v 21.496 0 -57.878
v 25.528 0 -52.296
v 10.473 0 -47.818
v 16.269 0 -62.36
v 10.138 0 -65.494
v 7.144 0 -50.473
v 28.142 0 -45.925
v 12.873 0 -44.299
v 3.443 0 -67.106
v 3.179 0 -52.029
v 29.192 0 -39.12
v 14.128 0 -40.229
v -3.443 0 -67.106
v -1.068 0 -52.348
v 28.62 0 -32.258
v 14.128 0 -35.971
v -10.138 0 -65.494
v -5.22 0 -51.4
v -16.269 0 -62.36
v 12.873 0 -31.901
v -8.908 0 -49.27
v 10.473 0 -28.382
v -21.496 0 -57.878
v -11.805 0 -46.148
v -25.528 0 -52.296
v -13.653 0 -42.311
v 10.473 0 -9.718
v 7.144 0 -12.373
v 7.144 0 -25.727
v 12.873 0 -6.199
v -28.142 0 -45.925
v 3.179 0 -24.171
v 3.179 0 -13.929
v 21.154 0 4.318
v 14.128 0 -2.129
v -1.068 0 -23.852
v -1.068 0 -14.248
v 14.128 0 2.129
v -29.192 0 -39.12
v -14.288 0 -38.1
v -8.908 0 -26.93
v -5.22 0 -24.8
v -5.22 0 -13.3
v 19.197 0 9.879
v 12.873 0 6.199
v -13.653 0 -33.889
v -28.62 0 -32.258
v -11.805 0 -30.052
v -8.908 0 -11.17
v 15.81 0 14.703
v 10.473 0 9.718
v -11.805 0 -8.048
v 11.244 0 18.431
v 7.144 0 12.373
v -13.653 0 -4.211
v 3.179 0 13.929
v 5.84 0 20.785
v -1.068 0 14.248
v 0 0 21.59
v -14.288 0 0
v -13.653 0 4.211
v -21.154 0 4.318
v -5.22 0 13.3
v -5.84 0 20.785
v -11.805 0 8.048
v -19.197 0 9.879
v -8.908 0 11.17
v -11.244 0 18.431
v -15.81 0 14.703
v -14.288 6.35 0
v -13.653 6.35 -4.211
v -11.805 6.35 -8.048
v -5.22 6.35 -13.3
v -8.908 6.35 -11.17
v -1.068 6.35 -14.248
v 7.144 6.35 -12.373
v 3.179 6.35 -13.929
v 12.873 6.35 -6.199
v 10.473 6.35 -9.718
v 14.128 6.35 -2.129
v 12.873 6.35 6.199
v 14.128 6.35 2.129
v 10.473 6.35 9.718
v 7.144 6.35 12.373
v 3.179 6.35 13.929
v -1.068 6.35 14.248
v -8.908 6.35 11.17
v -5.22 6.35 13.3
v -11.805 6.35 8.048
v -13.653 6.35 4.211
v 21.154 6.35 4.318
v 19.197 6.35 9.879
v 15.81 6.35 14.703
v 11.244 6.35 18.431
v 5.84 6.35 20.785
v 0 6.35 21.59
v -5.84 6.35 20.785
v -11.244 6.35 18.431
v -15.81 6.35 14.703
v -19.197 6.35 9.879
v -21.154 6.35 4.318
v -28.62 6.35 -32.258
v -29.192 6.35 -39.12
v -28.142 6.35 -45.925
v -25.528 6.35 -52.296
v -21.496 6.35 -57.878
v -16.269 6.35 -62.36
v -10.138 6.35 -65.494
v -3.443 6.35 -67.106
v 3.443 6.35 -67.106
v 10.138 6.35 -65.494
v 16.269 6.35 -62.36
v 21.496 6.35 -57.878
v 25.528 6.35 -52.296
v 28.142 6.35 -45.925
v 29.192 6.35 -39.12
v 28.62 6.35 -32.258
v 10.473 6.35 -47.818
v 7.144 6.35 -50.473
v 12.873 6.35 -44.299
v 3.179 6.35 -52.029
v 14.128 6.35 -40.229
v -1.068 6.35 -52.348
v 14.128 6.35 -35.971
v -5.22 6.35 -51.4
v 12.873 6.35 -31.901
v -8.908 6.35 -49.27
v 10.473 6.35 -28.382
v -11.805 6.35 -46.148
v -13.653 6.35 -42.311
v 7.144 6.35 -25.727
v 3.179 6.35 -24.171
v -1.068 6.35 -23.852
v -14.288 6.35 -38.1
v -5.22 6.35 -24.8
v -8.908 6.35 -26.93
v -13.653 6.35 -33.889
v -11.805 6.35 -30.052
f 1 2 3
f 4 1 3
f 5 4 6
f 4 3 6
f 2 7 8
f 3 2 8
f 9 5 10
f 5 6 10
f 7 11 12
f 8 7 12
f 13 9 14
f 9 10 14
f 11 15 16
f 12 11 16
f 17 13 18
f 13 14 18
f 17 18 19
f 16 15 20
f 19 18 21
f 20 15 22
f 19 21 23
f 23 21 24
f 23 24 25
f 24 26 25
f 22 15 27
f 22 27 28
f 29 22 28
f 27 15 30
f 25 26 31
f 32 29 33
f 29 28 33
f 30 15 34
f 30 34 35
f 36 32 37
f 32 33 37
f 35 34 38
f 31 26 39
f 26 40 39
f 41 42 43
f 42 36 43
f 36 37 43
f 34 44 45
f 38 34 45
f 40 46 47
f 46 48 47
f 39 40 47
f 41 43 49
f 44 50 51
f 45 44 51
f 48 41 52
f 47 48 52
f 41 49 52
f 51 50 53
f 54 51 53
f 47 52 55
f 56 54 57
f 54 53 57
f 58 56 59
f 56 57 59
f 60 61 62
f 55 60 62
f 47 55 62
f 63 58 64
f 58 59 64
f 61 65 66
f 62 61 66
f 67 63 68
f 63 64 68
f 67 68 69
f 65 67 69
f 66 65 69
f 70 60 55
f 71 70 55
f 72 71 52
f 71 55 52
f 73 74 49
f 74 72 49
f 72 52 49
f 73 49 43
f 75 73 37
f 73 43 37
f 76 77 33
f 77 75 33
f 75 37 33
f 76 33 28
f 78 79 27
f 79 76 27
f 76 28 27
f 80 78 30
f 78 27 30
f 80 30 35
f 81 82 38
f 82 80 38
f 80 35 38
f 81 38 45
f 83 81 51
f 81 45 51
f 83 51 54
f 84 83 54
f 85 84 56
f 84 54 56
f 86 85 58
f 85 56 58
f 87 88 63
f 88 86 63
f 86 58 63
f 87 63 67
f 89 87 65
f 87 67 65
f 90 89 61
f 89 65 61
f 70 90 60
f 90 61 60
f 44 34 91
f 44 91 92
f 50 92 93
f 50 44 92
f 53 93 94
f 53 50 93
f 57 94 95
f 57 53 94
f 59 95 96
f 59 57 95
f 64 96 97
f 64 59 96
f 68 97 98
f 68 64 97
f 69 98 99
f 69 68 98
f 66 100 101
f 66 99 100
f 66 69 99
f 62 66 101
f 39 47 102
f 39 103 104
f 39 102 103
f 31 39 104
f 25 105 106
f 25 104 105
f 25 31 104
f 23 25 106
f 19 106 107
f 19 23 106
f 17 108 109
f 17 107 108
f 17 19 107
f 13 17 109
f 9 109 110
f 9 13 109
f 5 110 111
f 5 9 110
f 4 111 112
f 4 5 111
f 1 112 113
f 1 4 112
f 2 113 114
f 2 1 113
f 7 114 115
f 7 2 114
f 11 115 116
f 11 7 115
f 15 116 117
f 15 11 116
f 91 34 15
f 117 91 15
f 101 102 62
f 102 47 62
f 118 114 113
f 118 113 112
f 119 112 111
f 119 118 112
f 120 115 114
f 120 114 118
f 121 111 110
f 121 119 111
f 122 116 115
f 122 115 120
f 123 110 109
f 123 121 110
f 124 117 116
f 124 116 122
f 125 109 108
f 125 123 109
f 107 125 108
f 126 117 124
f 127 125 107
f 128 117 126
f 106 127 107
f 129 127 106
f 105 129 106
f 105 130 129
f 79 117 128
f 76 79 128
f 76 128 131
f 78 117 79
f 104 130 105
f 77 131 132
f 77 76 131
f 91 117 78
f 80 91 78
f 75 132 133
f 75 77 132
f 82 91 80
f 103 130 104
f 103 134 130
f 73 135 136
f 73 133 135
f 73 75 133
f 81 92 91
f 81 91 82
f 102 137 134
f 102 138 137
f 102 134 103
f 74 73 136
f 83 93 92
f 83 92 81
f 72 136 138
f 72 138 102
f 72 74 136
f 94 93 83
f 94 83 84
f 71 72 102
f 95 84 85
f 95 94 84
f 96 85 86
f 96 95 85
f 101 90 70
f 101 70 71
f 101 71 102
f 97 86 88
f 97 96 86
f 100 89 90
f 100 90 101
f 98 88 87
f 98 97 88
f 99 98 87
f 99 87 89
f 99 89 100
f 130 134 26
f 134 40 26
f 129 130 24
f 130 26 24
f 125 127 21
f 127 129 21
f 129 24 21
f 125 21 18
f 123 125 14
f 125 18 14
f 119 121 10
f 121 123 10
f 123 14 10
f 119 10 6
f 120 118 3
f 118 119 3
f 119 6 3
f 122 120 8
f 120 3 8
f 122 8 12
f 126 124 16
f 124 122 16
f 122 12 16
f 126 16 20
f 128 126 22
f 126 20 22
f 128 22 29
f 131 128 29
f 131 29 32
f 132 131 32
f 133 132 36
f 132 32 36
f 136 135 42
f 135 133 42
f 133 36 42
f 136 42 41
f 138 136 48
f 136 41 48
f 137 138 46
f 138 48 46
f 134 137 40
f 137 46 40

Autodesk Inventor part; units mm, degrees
ref_plane "YZ Plane" through (0, 0, 0) normal (1, 0, 0) x (0, 1, 0)
ref_plane "XZ Plane" through (0, 0, 0) normal (0, 1, 0) x (-1, 0, 0)
ref_plane "XY Plane" through (0, 0, 0) normal (0, 0, 1) x (1, 0, 0)
sketch "Sketch1" plane through (0, 0, 0) normal (0, 1, 0) x (-1, 0, 0)
  circle A0 centre (0, 0) radius 15.24 construction
  circle A1 centre (0, -38.1) radius 22.86 construction
  circle A2 centre (0, 0) radius 14.2875
  circle A3 centre (0, -38.1) radius 14.2875
  line L0 (-14.9321, 3.048) -> (-22.3981, -33.528) construction
  line L1 (14.9321, 3.048) -> (22.3981, -33.528) construction
  arc A4 (-22.3981, -33.528) -> (22.3981, -33.528) centre (0, -38.1) ccw construction
  arc A5 (14.9321, 3.048) -> (-14.9321, 3.048) centre (0, 0) ccw construction
  line L2 (28.6198, -32.258) -> (21.1538, 4.318)
  arc A6 (21.1538, 4.318) -> (-21.1538, 4.318) centre (0, 0) ccw
  line L3 (-21.1538, 4.318) -> (-28.6198, -32.258)
  arc A7 (-28.6198, -32.258) -> (28.6198, -32.258) centre (0, -38.1) ccw
  dimension "d0" = 30.48
  dimension "d1" = 45.72
  dimension "d2" = 28.575
  dimension "d3" = 28.575
  dimension "d4" = 6.35
extrude "Extrusion1" add sketch "Sketch1" along normal blind 6.35
properties part number "DTraining2_001_E1Base"
